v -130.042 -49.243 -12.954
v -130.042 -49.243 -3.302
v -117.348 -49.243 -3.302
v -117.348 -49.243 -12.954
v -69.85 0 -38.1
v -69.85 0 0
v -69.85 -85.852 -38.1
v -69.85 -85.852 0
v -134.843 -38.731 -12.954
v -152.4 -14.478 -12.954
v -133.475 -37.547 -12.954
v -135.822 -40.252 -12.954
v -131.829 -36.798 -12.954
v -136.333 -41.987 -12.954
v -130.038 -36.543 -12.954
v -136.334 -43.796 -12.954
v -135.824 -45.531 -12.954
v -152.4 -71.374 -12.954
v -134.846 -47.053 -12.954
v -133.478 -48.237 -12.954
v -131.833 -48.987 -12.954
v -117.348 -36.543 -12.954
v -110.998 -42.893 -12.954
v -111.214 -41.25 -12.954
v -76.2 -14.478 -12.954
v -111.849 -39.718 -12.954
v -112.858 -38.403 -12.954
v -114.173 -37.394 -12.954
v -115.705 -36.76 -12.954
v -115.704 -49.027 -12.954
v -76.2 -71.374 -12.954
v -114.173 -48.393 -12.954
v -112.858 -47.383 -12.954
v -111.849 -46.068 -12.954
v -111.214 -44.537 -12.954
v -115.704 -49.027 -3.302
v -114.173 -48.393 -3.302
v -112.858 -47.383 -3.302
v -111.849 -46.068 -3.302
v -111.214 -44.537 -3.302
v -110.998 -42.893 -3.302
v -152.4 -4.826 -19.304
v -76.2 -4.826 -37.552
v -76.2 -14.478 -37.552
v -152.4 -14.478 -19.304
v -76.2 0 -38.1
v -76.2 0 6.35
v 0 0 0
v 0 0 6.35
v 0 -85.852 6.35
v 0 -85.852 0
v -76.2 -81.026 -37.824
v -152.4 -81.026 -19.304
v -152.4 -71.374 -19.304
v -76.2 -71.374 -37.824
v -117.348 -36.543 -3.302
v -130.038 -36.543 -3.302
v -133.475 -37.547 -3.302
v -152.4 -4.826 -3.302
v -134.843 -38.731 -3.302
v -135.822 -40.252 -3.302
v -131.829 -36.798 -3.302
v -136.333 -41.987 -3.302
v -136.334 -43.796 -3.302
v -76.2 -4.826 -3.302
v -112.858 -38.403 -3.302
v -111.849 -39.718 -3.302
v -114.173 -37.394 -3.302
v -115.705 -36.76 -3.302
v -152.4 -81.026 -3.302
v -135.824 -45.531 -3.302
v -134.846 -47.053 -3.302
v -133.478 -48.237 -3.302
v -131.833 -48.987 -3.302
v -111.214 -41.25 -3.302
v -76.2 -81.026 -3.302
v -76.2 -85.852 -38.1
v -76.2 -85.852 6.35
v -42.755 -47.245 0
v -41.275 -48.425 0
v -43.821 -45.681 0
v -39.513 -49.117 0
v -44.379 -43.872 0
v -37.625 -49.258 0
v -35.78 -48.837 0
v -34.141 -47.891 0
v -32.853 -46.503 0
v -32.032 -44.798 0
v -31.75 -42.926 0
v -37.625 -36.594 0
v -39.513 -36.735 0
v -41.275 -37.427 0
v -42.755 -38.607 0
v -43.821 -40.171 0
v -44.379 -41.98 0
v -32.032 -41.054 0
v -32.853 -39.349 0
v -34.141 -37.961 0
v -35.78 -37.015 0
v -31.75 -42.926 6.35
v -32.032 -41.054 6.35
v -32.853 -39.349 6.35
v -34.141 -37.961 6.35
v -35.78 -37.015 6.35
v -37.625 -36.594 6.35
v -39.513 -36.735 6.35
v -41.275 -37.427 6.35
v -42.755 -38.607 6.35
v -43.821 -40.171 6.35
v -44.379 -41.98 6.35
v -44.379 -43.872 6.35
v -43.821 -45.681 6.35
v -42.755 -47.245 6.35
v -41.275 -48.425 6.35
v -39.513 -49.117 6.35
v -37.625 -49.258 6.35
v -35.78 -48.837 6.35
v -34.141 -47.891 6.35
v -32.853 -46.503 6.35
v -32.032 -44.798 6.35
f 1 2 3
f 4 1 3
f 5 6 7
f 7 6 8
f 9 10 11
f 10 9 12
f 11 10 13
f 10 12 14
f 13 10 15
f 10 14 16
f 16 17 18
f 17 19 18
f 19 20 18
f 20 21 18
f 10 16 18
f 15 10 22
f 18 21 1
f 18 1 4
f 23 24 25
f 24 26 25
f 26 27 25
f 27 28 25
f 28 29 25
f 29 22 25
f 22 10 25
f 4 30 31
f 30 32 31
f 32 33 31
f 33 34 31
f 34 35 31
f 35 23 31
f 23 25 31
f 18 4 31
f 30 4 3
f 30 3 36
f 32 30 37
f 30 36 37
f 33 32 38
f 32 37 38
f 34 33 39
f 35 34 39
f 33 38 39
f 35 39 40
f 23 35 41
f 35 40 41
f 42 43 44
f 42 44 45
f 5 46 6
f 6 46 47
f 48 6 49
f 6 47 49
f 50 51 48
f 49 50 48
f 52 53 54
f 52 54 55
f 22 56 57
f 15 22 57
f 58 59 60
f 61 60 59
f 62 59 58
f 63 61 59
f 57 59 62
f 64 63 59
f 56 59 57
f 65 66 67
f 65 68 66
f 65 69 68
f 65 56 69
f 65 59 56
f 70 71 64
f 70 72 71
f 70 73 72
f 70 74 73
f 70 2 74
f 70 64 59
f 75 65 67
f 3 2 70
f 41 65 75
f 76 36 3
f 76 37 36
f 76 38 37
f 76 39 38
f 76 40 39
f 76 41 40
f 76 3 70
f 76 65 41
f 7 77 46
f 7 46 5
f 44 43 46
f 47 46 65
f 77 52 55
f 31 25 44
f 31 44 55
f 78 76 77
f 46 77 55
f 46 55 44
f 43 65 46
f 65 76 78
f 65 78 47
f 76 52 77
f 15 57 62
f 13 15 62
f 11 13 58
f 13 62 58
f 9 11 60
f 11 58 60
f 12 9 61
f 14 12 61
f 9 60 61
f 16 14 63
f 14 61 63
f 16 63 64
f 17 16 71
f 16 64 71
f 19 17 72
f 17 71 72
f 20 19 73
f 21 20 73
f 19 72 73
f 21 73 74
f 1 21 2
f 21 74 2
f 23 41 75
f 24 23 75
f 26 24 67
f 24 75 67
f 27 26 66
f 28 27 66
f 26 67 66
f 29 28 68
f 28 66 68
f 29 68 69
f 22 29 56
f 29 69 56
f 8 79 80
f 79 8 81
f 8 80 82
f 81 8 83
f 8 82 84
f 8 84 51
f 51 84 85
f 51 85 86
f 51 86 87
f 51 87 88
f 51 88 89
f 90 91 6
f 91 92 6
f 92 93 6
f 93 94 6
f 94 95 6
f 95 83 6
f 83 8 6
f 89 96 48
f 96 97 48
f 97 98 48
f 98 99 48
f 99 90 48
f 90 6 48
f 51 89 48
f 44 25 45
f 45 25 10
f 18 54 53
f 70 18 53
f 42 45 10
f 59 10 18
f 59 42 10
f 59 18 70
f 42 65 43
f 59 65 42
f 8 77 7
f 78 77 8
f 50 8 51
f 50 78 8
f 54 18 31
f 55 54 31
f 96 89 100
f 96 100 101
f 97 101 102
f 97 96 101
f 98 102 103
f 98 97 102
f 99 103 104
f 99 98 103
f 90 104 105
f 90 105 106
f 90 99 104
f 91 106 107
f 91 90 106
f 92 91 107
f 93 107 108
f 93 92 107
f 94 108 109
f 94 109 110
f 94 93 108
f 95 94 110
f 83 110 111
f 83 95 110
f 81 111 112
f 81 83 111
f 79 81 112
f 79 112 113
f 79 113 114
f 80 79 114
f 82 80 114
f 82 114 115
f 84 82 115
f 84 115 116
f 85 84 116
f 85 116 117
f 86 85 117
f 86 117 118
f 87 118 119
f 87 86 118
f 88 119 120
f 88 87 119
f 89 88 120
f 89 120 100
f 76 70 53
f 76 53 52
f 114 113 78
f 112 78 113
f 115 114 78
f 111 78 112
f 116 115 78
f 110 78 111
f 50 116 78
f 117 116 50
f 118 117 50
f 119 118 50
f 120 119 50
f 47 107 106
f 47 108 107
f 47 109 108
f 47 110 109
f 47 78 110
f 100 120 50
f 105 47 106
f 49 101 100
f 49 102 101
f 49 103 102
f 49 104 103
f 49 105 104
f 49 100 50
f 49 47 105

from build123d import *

# Parameters (mm, degrees)
F0_R      = 6.35
F1_DEPTH  = 6.35
F2_W      = 6.35
F2_H      = 85.852
F3_DEPTH  = 38.1
F4_W      = 76.2
F4_H      = 9.652
F5_DEPTH  = 76.2
F7_DEPTH  = 10.16
F9_DEPTH  = 9.652
F11_DEPTH = 9.652


with BuildPart() as f1:
    # F0 (on Top) → F1 (new body)
    with BuildSketch(Plane.XY):
        Polygon((0, -85.852), (0, 0), (-38.1, 0), (-76.2, 0), (-76.2, -85.852), align=None)
        with Locations((-38.1, -42.926)):
            Circle(F0_R, mode=Mode.SUBTRACT)
    extrude(amount=F1_DEPTH)

    # F2 (on face) → F3 (join)
    with BuildSketch(Plane(origin=(0, 0, 0), x_dir=(1, 0, 0), z_dir=(0, 0, -1))):
        with Locations((-73.025, 42.926)):
            Rectangle(F2_W, F2_H)
    extrude(amount=F3_DEPTH)

    # F4 (on face) → F5 (join)
    with BuildSketch(Plane(origin=(-76.2, 0, 0), x_dir=(0, -1, 0), z_dir=(-1, 0, 0))):
        with Locations((42.926, -8.128)):
            Rectangle(F4_W, F4_H)
    extrude(amount=F5_DEPTH)

    # F6 (on face) → F7 (cut)
    with BuildSketch(Plane.XY.offset(-3.302)):
        with BuildLine():
            ThreePointArc((-130.041851, -49.243254), (-125.555699, -47.381211), (-123.698, -42.893257))
            ThreePointArc((-123.698, -42.893257), (-125.554284, -38.40672), (-130.037848, -36.543265))
            ThreePointArc((-130.037848, -36.543265), (-136.398, -42.891255), (-130.041851, -49.243254))
        make_face()
        with BuildLine():
            ThreePointArc((-123.698, -42.893257), (-121.838129, -38.40313), (-117.348004, -36.543257))
            Line((-117.348004, -36.543257), (-130.037848, -36.543265))
            ThreePointArc((-130.037848, -36.543265), (-125.554284, -38.40672), (-123.698, -42.893257))
        make_face()
        with BuildLine():
            ThreePointArc((-117.348001, -49.243257), (-112.857872, -47.383386), (-110.998, -42.893257))
            ThreePointArc((-110.998, -42.893257), (-112.857873, -38.403127), (-117.348004, -36.543257))
            ThreePointArc((-117.348004, -36.543257), (-121.838129, -38.40313), (-123.698, -42.893257))
            ThreePointArc((-123.698, -42.893257), (-121.838129, -47.383385), (-117.348001, -49.243257))
        make_face()
        with BuildLine():
            Line((-130.041851, -49.243254), (-117.348001, -49.243257))
            ThreePointArc((-117.348001, -49.243257), (-121.838129, -47.383385), (-123.698, -42.893257))
            ThreePointArc((-123.698, -42.893257), (-125.555699, -47.381211), (-130.041851, -49.243254))
        make_face()
    extrude(amount=-F7_DEPTH, mode=Mode.SUBTRACT)

    # F8 (on face) → F9 (join)
    with BuildSketch(Plane.XZ.offset(81.026)):
        Polygon((-76.2, -12.954), (-152.4, -12.954), (-152.4, -19.304), (-75.782955, -37.925284), align=None)
    extrude(amount=-F9_DEPTH)

    # F10 (on face) → F11 (join)
    with BuildSketch(Plane(origin=(0, -4.826, 0), x_dir=(-1, 0, 0), z_dir=(0, 1, 0))):
        Polygon((152.4, -19.304), (152.4, -12.954), (76.2, -12.954), (75.944759, -37.612777), align=None)
    extrude(amount=-F11_DEPTH)


solid = f1.part
